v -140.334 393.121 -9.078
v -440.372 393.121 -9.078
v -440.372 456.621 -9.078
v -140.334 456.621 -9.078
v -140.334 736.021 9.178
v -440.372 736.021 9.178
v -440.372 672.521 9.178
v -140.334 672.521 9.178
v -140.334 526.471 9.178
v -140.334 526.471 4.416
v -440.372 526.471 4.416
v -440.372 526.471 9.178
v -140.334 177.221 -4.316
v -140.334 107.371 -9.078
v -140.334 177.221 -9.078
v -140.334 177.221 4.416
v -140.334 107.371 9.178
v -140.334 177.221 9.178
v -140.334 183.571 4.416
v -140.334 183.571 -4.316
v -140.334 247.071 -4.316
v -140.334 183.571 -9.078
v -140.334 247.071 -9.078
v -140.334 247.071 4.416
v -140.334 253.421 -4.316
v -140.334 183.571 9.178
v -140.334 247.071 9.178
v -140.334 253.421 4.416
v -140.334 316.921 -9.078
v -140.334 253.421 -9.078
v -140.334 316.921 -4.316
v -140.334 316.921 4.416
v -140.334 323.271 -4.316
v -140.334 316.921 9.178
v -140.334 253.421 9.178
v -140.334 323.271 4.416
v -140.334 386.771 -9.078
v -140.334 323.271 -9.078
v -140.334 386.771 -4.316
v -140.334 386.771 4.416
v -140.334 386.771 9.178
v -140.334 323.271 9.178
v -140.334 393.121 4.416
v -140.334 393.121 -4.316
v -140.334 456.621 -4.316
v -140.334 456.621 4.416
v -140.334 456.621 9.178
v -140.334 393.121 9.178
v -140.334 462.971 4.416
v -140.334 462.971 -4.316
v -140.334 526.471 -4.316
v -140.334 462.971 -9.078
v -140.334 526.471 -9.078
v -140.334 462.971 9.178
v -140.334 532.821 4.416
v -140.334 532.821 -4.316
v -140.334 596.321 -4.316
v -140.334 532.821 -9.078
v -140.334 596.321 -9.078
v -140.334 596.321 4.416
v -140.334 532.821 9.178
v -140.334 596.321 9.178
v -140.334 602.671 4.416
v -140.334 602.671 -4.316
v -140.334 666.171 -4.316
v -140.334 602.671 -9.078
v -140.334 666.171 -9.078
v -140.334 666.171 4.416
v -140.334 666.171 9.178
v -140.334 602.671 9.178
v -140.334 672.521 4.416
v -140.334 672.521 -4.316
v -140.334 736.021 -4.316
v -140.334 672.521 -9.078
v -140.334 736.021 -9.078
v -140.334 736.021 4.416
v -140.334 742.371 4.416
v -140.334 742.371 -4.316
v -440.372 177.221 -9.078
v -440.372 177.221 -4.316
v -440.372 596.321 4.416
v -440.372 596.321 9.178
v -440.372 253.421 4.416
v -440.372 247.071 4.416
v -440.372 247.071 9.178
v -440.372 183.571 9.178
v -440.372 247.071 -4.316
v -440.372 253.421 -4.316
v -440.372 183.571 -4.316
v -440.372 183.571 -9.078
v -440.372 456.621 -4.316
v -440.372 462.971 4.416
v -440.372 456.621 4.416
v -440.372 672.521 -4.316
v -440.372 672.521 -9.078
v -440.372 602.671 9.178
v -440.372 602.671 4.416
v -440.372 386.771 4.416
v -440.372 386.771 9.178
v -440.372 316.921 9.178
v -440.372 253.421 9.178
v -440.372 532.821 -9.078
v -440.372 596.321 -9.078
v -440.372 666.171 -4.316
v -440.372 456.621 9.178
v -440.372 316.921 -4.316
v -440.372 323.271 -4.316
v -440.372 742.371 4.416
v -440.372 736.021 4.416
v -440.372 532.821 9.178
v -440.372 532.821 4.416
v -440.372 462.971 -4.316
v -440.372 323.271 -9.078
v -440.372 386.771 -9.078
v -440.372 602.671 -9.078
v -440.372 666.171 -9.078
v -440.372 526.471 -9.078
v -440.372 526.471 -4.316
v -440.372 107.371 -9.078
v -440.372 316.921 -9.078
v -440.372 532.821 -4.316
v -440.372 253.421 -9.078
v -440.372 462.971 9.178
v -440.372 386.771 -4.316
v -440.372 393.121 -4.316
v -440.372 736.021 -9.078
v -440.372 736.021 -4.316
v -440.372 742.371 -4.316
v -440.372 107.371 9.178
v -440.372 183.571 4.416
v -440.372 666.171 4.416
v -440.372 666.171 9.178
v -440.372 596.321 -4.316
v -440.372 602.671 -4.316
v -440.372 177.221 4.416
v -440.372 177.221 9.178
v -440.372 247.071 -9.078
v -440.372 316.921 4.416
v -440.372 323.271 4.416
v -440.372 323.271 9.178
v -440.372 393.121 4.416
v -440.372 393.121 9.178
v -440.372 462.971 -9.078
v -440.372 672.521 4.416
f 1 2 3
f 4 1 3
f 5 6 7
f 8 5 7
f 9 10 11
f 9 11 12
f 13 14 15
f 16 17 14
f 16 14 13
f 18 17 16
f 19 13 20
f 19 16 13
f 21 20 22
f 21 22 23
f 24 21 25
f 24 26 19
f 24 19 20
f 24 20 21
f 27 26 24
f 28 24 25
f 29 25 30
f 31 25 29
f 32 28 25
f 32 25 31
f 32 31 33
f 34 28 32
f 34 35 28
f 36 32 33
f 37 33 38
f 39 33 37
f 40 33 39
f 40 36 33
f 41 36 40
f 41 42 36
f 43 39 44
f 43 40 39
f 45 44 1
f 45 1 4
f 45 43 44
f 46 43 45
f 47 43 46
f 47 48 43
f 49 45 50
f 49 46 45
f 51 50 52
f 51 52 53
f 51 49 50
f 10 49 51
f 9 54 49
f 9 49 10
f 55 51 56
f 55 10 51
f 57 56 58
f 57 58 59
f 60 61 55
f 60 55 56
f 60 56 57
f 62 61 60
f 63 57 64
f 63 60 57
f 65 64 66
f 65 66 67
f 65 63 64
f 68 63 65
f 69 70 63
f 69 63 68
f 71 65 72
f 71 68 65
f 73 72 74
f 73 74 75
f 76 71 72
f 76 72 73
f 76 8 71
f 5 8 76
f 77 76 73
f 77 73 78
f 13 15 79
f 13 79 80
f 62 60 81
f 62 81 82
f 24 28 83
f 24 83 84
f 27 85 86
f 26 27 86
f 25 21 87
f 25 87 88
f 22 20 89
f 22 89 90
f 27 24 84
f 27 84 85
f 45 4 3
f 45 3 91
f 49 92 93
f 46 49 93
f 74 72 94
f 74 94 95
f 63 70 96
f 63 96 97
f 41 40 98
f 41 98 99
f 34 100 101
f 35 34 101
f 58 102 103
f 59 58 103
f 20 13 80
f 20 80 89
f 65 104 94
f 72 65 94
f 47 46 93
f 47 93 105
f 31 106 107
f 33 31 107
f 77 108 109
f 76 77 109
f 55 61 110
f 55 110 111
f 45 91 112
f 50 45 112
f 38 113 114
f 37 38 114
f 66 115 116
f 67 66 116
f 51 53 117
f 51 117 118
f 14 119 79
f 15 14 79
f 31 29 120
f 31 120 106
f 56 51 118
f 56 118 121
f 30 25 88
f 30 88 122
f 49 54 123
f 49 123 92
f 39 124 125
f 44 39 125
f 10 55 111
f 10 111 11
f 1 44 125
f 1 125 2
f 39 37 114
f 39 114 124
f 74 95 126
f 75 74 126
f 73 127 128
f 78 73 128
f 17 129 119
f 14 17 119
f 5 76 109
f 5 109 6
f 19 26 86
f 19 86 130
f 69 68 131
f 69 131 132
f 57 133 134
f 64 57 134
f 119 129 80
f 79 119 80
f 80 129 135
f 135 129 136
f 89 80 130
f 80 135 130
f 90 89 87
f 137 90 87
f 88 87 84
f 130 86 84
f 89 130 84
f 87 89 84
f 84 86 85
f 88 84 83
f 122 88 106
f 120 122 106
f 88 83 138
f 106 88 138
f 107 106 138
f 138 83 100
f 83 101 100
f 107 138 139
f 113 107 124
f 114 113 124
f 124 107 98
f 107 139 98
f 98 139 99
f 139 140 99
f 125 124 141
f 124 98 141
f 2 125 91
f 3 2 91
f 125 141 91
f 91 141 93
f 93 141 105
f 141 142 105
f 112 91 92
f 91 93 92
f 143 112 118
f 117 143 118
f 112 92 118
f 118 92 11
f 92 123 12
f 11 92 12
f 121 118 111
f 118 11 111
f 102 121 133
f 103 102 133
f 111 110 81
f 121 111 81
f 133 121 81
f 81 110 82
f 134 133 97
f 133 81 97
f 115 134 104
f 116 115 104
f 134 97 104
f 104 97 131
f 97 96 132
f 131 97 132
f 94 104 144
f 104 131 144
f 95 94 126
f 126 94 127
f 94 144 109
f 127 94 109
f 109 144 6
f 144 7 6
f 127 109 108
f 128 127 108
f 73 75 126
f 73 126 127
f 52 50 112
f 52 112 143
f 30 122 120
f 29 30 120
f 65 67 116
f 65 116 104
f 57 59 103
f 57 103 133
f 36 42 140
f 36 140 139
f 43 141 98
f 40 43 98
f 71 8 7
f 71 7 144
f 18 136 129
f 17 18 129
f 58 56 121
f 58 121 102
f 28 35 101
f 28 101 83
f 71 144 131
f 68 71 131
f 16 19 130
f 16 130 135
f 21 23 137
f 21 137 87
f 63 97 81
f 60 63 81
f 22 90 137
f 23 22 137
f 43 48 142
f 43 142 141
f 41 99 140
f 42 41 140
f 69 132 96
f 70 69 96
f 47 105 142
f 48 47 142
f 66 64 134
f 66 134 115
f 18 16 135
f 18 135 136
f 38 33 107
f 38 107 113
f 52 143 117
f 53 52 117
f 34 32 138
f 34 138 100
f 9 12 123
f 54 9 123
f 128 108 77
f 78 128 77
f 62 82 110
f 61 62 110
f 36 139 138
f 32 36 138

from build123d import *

# Parameters (mm, degrees)
PARTSCAB_REFERENCE_START = -1615.650675561
PARTSCAB_REFERENCE_DEPTH = 1475.316666667
SKETCH1_OUTSIDE_W        = 1806.569
SKETCH1_OUTSIDE_H        = 1061.502
SKETCH1_OUTSIDE_W_2      = 300.0375
SKETCH1_OUTSIDE_H_2      = 730.25
CUT_EXTRUDE1_DEPTH       = 1820.964329577
SKETCH2_W                = 300.0375
SKETCH2_H                = 95.25
CUT_EXTRUDE2_DEPTH       = 947.50415812


# Read off the part's stored shape, not the designer's step: PartsCab_Reference
with BuildPart() as part:
    # PartsCab_Reference outline → PartsCab_Reference (new body)
    with BuildSketch(Plane.YZ.offset(PARTSCAB_REFERENCE_START)):
        Polygon((107.371492578, 9.178125), (107.371492578, -9.078125), (177.221492578, -9.078125), (177.221492578, -4.315625), (183.571492578, -4.315625), (183.571492578, -9.078125), (247.071492578, -9.078125), (247.071492578, -4.315625), (253.421492578, -4.315625), (253.421492578, -9.078125), (316.921492578, -9.078125), (316.921492578, -4.315625), (323.271492578, -4.315625), (323.271492578, -9.078125), (386.771492578, -9.078125), (386.771492578, -4.315625), (393.121492578, -4.315625), (393.121492578, -9.078125), (456.621492578, -9.078125), (456.621492578, -4.315625), (462.971492578, -4.315625), (462.971492578, -9.078125), (526.471492578, -9.078125), (526.471492578, -4.315625), (532.821492578, -4.315625), (532.821492578, -9.078125), (596.321492578, -9.078125), (596.321492578, -4.315625), (602.671492578, -4.315625), (602.671492578, -9.078125), (666.171492578, -9.078125), (666.171492578, -4.315625), (672.521492578, -4.315625), (672.521492578, -9.078125), (736.021492578, -9.078125), (736.021492578, -4.315625), (742.371492578, -4.315625), (742.371492578, -9.078125), (837.621492578, -9.078125), (837.621492578, 9.178125), (742.371492578, 9.178125), (742.371492578, 4.415625), (736.021492578, 4.415625), (736.021492578, 9.178125), (672.521492578, 9.178125), (672.521492578, 4.415625), (666.171492578, 4.415625), (666.171492578, 9.178125), (602.671492578, 9.178125), (602.671492578, 4.415625), (596.321492578, 4.415625), (596.321492578, 9.178125), (532.821492578, 9.178125), (532.821492578, 4.415625), (526.471492578, 4.415625), (526.471492578, 9.178125), (462.971492578, 9.178125), (462.971492578, 4.415625), (456.621492578, 4.415625), (456.621492578, 9.178125), (393.121492578, 9.178125), (393.121492578, 4.415625), (386.771492578, 4.415625), (386.771492578, 9.178125), (323.271492578, 9.178125), (323.271492578, 4.415625), (316.921492578, 4.415625), (316.921492578, 9.178125), (253.421492578, 9.178125), (253.421492578, 4.415625), (247.071492578, 4.415625), (247.071492578, 9.178125), (183.571492578, 9.178125), (183.571492578, 4.415625), (177.221492578, 4.415625), (177.221492578, 9.178125), align=None)
    extrude(amount=PARTSCAB_REFERENCE_DEPTH)

    # Sketch1 outside → Cut-Extrude1 (cut, through all)
    with BuildSketch(Plane.XY.offset(9.178125)):
        with Locations((-877.9925, 472.496)):
            Rectangle(SKETCH1_OUTSIDE_W, SKETCH1_OUTSIDE_H)
        with Locations((-290.352758894, 472.496492578)):
            Rectangle(SKETCH1_OUTSIDE_W_2, SKETCH1_OUTSIDE_H_2, mode=Mode.SUBTRACT)
    extrude(amount=-CUT_EXTRUDE1_DEPTH, mode=Mode.SUBTRACT)

    # Sketch2 → Cut-Extrude2 (cut, through all)
    with BuildSketch(Plane.XY.offset(9.178125)):
        with Locations((-290.352758894, 789.996492578)):
            Rectangle(SKETCH2_W, SKETCH2_H)
    extrude(amount=-CUT_EXTRUDE2_DEPTH, mode=Mode.SUBTRACT)


solid = part.part
